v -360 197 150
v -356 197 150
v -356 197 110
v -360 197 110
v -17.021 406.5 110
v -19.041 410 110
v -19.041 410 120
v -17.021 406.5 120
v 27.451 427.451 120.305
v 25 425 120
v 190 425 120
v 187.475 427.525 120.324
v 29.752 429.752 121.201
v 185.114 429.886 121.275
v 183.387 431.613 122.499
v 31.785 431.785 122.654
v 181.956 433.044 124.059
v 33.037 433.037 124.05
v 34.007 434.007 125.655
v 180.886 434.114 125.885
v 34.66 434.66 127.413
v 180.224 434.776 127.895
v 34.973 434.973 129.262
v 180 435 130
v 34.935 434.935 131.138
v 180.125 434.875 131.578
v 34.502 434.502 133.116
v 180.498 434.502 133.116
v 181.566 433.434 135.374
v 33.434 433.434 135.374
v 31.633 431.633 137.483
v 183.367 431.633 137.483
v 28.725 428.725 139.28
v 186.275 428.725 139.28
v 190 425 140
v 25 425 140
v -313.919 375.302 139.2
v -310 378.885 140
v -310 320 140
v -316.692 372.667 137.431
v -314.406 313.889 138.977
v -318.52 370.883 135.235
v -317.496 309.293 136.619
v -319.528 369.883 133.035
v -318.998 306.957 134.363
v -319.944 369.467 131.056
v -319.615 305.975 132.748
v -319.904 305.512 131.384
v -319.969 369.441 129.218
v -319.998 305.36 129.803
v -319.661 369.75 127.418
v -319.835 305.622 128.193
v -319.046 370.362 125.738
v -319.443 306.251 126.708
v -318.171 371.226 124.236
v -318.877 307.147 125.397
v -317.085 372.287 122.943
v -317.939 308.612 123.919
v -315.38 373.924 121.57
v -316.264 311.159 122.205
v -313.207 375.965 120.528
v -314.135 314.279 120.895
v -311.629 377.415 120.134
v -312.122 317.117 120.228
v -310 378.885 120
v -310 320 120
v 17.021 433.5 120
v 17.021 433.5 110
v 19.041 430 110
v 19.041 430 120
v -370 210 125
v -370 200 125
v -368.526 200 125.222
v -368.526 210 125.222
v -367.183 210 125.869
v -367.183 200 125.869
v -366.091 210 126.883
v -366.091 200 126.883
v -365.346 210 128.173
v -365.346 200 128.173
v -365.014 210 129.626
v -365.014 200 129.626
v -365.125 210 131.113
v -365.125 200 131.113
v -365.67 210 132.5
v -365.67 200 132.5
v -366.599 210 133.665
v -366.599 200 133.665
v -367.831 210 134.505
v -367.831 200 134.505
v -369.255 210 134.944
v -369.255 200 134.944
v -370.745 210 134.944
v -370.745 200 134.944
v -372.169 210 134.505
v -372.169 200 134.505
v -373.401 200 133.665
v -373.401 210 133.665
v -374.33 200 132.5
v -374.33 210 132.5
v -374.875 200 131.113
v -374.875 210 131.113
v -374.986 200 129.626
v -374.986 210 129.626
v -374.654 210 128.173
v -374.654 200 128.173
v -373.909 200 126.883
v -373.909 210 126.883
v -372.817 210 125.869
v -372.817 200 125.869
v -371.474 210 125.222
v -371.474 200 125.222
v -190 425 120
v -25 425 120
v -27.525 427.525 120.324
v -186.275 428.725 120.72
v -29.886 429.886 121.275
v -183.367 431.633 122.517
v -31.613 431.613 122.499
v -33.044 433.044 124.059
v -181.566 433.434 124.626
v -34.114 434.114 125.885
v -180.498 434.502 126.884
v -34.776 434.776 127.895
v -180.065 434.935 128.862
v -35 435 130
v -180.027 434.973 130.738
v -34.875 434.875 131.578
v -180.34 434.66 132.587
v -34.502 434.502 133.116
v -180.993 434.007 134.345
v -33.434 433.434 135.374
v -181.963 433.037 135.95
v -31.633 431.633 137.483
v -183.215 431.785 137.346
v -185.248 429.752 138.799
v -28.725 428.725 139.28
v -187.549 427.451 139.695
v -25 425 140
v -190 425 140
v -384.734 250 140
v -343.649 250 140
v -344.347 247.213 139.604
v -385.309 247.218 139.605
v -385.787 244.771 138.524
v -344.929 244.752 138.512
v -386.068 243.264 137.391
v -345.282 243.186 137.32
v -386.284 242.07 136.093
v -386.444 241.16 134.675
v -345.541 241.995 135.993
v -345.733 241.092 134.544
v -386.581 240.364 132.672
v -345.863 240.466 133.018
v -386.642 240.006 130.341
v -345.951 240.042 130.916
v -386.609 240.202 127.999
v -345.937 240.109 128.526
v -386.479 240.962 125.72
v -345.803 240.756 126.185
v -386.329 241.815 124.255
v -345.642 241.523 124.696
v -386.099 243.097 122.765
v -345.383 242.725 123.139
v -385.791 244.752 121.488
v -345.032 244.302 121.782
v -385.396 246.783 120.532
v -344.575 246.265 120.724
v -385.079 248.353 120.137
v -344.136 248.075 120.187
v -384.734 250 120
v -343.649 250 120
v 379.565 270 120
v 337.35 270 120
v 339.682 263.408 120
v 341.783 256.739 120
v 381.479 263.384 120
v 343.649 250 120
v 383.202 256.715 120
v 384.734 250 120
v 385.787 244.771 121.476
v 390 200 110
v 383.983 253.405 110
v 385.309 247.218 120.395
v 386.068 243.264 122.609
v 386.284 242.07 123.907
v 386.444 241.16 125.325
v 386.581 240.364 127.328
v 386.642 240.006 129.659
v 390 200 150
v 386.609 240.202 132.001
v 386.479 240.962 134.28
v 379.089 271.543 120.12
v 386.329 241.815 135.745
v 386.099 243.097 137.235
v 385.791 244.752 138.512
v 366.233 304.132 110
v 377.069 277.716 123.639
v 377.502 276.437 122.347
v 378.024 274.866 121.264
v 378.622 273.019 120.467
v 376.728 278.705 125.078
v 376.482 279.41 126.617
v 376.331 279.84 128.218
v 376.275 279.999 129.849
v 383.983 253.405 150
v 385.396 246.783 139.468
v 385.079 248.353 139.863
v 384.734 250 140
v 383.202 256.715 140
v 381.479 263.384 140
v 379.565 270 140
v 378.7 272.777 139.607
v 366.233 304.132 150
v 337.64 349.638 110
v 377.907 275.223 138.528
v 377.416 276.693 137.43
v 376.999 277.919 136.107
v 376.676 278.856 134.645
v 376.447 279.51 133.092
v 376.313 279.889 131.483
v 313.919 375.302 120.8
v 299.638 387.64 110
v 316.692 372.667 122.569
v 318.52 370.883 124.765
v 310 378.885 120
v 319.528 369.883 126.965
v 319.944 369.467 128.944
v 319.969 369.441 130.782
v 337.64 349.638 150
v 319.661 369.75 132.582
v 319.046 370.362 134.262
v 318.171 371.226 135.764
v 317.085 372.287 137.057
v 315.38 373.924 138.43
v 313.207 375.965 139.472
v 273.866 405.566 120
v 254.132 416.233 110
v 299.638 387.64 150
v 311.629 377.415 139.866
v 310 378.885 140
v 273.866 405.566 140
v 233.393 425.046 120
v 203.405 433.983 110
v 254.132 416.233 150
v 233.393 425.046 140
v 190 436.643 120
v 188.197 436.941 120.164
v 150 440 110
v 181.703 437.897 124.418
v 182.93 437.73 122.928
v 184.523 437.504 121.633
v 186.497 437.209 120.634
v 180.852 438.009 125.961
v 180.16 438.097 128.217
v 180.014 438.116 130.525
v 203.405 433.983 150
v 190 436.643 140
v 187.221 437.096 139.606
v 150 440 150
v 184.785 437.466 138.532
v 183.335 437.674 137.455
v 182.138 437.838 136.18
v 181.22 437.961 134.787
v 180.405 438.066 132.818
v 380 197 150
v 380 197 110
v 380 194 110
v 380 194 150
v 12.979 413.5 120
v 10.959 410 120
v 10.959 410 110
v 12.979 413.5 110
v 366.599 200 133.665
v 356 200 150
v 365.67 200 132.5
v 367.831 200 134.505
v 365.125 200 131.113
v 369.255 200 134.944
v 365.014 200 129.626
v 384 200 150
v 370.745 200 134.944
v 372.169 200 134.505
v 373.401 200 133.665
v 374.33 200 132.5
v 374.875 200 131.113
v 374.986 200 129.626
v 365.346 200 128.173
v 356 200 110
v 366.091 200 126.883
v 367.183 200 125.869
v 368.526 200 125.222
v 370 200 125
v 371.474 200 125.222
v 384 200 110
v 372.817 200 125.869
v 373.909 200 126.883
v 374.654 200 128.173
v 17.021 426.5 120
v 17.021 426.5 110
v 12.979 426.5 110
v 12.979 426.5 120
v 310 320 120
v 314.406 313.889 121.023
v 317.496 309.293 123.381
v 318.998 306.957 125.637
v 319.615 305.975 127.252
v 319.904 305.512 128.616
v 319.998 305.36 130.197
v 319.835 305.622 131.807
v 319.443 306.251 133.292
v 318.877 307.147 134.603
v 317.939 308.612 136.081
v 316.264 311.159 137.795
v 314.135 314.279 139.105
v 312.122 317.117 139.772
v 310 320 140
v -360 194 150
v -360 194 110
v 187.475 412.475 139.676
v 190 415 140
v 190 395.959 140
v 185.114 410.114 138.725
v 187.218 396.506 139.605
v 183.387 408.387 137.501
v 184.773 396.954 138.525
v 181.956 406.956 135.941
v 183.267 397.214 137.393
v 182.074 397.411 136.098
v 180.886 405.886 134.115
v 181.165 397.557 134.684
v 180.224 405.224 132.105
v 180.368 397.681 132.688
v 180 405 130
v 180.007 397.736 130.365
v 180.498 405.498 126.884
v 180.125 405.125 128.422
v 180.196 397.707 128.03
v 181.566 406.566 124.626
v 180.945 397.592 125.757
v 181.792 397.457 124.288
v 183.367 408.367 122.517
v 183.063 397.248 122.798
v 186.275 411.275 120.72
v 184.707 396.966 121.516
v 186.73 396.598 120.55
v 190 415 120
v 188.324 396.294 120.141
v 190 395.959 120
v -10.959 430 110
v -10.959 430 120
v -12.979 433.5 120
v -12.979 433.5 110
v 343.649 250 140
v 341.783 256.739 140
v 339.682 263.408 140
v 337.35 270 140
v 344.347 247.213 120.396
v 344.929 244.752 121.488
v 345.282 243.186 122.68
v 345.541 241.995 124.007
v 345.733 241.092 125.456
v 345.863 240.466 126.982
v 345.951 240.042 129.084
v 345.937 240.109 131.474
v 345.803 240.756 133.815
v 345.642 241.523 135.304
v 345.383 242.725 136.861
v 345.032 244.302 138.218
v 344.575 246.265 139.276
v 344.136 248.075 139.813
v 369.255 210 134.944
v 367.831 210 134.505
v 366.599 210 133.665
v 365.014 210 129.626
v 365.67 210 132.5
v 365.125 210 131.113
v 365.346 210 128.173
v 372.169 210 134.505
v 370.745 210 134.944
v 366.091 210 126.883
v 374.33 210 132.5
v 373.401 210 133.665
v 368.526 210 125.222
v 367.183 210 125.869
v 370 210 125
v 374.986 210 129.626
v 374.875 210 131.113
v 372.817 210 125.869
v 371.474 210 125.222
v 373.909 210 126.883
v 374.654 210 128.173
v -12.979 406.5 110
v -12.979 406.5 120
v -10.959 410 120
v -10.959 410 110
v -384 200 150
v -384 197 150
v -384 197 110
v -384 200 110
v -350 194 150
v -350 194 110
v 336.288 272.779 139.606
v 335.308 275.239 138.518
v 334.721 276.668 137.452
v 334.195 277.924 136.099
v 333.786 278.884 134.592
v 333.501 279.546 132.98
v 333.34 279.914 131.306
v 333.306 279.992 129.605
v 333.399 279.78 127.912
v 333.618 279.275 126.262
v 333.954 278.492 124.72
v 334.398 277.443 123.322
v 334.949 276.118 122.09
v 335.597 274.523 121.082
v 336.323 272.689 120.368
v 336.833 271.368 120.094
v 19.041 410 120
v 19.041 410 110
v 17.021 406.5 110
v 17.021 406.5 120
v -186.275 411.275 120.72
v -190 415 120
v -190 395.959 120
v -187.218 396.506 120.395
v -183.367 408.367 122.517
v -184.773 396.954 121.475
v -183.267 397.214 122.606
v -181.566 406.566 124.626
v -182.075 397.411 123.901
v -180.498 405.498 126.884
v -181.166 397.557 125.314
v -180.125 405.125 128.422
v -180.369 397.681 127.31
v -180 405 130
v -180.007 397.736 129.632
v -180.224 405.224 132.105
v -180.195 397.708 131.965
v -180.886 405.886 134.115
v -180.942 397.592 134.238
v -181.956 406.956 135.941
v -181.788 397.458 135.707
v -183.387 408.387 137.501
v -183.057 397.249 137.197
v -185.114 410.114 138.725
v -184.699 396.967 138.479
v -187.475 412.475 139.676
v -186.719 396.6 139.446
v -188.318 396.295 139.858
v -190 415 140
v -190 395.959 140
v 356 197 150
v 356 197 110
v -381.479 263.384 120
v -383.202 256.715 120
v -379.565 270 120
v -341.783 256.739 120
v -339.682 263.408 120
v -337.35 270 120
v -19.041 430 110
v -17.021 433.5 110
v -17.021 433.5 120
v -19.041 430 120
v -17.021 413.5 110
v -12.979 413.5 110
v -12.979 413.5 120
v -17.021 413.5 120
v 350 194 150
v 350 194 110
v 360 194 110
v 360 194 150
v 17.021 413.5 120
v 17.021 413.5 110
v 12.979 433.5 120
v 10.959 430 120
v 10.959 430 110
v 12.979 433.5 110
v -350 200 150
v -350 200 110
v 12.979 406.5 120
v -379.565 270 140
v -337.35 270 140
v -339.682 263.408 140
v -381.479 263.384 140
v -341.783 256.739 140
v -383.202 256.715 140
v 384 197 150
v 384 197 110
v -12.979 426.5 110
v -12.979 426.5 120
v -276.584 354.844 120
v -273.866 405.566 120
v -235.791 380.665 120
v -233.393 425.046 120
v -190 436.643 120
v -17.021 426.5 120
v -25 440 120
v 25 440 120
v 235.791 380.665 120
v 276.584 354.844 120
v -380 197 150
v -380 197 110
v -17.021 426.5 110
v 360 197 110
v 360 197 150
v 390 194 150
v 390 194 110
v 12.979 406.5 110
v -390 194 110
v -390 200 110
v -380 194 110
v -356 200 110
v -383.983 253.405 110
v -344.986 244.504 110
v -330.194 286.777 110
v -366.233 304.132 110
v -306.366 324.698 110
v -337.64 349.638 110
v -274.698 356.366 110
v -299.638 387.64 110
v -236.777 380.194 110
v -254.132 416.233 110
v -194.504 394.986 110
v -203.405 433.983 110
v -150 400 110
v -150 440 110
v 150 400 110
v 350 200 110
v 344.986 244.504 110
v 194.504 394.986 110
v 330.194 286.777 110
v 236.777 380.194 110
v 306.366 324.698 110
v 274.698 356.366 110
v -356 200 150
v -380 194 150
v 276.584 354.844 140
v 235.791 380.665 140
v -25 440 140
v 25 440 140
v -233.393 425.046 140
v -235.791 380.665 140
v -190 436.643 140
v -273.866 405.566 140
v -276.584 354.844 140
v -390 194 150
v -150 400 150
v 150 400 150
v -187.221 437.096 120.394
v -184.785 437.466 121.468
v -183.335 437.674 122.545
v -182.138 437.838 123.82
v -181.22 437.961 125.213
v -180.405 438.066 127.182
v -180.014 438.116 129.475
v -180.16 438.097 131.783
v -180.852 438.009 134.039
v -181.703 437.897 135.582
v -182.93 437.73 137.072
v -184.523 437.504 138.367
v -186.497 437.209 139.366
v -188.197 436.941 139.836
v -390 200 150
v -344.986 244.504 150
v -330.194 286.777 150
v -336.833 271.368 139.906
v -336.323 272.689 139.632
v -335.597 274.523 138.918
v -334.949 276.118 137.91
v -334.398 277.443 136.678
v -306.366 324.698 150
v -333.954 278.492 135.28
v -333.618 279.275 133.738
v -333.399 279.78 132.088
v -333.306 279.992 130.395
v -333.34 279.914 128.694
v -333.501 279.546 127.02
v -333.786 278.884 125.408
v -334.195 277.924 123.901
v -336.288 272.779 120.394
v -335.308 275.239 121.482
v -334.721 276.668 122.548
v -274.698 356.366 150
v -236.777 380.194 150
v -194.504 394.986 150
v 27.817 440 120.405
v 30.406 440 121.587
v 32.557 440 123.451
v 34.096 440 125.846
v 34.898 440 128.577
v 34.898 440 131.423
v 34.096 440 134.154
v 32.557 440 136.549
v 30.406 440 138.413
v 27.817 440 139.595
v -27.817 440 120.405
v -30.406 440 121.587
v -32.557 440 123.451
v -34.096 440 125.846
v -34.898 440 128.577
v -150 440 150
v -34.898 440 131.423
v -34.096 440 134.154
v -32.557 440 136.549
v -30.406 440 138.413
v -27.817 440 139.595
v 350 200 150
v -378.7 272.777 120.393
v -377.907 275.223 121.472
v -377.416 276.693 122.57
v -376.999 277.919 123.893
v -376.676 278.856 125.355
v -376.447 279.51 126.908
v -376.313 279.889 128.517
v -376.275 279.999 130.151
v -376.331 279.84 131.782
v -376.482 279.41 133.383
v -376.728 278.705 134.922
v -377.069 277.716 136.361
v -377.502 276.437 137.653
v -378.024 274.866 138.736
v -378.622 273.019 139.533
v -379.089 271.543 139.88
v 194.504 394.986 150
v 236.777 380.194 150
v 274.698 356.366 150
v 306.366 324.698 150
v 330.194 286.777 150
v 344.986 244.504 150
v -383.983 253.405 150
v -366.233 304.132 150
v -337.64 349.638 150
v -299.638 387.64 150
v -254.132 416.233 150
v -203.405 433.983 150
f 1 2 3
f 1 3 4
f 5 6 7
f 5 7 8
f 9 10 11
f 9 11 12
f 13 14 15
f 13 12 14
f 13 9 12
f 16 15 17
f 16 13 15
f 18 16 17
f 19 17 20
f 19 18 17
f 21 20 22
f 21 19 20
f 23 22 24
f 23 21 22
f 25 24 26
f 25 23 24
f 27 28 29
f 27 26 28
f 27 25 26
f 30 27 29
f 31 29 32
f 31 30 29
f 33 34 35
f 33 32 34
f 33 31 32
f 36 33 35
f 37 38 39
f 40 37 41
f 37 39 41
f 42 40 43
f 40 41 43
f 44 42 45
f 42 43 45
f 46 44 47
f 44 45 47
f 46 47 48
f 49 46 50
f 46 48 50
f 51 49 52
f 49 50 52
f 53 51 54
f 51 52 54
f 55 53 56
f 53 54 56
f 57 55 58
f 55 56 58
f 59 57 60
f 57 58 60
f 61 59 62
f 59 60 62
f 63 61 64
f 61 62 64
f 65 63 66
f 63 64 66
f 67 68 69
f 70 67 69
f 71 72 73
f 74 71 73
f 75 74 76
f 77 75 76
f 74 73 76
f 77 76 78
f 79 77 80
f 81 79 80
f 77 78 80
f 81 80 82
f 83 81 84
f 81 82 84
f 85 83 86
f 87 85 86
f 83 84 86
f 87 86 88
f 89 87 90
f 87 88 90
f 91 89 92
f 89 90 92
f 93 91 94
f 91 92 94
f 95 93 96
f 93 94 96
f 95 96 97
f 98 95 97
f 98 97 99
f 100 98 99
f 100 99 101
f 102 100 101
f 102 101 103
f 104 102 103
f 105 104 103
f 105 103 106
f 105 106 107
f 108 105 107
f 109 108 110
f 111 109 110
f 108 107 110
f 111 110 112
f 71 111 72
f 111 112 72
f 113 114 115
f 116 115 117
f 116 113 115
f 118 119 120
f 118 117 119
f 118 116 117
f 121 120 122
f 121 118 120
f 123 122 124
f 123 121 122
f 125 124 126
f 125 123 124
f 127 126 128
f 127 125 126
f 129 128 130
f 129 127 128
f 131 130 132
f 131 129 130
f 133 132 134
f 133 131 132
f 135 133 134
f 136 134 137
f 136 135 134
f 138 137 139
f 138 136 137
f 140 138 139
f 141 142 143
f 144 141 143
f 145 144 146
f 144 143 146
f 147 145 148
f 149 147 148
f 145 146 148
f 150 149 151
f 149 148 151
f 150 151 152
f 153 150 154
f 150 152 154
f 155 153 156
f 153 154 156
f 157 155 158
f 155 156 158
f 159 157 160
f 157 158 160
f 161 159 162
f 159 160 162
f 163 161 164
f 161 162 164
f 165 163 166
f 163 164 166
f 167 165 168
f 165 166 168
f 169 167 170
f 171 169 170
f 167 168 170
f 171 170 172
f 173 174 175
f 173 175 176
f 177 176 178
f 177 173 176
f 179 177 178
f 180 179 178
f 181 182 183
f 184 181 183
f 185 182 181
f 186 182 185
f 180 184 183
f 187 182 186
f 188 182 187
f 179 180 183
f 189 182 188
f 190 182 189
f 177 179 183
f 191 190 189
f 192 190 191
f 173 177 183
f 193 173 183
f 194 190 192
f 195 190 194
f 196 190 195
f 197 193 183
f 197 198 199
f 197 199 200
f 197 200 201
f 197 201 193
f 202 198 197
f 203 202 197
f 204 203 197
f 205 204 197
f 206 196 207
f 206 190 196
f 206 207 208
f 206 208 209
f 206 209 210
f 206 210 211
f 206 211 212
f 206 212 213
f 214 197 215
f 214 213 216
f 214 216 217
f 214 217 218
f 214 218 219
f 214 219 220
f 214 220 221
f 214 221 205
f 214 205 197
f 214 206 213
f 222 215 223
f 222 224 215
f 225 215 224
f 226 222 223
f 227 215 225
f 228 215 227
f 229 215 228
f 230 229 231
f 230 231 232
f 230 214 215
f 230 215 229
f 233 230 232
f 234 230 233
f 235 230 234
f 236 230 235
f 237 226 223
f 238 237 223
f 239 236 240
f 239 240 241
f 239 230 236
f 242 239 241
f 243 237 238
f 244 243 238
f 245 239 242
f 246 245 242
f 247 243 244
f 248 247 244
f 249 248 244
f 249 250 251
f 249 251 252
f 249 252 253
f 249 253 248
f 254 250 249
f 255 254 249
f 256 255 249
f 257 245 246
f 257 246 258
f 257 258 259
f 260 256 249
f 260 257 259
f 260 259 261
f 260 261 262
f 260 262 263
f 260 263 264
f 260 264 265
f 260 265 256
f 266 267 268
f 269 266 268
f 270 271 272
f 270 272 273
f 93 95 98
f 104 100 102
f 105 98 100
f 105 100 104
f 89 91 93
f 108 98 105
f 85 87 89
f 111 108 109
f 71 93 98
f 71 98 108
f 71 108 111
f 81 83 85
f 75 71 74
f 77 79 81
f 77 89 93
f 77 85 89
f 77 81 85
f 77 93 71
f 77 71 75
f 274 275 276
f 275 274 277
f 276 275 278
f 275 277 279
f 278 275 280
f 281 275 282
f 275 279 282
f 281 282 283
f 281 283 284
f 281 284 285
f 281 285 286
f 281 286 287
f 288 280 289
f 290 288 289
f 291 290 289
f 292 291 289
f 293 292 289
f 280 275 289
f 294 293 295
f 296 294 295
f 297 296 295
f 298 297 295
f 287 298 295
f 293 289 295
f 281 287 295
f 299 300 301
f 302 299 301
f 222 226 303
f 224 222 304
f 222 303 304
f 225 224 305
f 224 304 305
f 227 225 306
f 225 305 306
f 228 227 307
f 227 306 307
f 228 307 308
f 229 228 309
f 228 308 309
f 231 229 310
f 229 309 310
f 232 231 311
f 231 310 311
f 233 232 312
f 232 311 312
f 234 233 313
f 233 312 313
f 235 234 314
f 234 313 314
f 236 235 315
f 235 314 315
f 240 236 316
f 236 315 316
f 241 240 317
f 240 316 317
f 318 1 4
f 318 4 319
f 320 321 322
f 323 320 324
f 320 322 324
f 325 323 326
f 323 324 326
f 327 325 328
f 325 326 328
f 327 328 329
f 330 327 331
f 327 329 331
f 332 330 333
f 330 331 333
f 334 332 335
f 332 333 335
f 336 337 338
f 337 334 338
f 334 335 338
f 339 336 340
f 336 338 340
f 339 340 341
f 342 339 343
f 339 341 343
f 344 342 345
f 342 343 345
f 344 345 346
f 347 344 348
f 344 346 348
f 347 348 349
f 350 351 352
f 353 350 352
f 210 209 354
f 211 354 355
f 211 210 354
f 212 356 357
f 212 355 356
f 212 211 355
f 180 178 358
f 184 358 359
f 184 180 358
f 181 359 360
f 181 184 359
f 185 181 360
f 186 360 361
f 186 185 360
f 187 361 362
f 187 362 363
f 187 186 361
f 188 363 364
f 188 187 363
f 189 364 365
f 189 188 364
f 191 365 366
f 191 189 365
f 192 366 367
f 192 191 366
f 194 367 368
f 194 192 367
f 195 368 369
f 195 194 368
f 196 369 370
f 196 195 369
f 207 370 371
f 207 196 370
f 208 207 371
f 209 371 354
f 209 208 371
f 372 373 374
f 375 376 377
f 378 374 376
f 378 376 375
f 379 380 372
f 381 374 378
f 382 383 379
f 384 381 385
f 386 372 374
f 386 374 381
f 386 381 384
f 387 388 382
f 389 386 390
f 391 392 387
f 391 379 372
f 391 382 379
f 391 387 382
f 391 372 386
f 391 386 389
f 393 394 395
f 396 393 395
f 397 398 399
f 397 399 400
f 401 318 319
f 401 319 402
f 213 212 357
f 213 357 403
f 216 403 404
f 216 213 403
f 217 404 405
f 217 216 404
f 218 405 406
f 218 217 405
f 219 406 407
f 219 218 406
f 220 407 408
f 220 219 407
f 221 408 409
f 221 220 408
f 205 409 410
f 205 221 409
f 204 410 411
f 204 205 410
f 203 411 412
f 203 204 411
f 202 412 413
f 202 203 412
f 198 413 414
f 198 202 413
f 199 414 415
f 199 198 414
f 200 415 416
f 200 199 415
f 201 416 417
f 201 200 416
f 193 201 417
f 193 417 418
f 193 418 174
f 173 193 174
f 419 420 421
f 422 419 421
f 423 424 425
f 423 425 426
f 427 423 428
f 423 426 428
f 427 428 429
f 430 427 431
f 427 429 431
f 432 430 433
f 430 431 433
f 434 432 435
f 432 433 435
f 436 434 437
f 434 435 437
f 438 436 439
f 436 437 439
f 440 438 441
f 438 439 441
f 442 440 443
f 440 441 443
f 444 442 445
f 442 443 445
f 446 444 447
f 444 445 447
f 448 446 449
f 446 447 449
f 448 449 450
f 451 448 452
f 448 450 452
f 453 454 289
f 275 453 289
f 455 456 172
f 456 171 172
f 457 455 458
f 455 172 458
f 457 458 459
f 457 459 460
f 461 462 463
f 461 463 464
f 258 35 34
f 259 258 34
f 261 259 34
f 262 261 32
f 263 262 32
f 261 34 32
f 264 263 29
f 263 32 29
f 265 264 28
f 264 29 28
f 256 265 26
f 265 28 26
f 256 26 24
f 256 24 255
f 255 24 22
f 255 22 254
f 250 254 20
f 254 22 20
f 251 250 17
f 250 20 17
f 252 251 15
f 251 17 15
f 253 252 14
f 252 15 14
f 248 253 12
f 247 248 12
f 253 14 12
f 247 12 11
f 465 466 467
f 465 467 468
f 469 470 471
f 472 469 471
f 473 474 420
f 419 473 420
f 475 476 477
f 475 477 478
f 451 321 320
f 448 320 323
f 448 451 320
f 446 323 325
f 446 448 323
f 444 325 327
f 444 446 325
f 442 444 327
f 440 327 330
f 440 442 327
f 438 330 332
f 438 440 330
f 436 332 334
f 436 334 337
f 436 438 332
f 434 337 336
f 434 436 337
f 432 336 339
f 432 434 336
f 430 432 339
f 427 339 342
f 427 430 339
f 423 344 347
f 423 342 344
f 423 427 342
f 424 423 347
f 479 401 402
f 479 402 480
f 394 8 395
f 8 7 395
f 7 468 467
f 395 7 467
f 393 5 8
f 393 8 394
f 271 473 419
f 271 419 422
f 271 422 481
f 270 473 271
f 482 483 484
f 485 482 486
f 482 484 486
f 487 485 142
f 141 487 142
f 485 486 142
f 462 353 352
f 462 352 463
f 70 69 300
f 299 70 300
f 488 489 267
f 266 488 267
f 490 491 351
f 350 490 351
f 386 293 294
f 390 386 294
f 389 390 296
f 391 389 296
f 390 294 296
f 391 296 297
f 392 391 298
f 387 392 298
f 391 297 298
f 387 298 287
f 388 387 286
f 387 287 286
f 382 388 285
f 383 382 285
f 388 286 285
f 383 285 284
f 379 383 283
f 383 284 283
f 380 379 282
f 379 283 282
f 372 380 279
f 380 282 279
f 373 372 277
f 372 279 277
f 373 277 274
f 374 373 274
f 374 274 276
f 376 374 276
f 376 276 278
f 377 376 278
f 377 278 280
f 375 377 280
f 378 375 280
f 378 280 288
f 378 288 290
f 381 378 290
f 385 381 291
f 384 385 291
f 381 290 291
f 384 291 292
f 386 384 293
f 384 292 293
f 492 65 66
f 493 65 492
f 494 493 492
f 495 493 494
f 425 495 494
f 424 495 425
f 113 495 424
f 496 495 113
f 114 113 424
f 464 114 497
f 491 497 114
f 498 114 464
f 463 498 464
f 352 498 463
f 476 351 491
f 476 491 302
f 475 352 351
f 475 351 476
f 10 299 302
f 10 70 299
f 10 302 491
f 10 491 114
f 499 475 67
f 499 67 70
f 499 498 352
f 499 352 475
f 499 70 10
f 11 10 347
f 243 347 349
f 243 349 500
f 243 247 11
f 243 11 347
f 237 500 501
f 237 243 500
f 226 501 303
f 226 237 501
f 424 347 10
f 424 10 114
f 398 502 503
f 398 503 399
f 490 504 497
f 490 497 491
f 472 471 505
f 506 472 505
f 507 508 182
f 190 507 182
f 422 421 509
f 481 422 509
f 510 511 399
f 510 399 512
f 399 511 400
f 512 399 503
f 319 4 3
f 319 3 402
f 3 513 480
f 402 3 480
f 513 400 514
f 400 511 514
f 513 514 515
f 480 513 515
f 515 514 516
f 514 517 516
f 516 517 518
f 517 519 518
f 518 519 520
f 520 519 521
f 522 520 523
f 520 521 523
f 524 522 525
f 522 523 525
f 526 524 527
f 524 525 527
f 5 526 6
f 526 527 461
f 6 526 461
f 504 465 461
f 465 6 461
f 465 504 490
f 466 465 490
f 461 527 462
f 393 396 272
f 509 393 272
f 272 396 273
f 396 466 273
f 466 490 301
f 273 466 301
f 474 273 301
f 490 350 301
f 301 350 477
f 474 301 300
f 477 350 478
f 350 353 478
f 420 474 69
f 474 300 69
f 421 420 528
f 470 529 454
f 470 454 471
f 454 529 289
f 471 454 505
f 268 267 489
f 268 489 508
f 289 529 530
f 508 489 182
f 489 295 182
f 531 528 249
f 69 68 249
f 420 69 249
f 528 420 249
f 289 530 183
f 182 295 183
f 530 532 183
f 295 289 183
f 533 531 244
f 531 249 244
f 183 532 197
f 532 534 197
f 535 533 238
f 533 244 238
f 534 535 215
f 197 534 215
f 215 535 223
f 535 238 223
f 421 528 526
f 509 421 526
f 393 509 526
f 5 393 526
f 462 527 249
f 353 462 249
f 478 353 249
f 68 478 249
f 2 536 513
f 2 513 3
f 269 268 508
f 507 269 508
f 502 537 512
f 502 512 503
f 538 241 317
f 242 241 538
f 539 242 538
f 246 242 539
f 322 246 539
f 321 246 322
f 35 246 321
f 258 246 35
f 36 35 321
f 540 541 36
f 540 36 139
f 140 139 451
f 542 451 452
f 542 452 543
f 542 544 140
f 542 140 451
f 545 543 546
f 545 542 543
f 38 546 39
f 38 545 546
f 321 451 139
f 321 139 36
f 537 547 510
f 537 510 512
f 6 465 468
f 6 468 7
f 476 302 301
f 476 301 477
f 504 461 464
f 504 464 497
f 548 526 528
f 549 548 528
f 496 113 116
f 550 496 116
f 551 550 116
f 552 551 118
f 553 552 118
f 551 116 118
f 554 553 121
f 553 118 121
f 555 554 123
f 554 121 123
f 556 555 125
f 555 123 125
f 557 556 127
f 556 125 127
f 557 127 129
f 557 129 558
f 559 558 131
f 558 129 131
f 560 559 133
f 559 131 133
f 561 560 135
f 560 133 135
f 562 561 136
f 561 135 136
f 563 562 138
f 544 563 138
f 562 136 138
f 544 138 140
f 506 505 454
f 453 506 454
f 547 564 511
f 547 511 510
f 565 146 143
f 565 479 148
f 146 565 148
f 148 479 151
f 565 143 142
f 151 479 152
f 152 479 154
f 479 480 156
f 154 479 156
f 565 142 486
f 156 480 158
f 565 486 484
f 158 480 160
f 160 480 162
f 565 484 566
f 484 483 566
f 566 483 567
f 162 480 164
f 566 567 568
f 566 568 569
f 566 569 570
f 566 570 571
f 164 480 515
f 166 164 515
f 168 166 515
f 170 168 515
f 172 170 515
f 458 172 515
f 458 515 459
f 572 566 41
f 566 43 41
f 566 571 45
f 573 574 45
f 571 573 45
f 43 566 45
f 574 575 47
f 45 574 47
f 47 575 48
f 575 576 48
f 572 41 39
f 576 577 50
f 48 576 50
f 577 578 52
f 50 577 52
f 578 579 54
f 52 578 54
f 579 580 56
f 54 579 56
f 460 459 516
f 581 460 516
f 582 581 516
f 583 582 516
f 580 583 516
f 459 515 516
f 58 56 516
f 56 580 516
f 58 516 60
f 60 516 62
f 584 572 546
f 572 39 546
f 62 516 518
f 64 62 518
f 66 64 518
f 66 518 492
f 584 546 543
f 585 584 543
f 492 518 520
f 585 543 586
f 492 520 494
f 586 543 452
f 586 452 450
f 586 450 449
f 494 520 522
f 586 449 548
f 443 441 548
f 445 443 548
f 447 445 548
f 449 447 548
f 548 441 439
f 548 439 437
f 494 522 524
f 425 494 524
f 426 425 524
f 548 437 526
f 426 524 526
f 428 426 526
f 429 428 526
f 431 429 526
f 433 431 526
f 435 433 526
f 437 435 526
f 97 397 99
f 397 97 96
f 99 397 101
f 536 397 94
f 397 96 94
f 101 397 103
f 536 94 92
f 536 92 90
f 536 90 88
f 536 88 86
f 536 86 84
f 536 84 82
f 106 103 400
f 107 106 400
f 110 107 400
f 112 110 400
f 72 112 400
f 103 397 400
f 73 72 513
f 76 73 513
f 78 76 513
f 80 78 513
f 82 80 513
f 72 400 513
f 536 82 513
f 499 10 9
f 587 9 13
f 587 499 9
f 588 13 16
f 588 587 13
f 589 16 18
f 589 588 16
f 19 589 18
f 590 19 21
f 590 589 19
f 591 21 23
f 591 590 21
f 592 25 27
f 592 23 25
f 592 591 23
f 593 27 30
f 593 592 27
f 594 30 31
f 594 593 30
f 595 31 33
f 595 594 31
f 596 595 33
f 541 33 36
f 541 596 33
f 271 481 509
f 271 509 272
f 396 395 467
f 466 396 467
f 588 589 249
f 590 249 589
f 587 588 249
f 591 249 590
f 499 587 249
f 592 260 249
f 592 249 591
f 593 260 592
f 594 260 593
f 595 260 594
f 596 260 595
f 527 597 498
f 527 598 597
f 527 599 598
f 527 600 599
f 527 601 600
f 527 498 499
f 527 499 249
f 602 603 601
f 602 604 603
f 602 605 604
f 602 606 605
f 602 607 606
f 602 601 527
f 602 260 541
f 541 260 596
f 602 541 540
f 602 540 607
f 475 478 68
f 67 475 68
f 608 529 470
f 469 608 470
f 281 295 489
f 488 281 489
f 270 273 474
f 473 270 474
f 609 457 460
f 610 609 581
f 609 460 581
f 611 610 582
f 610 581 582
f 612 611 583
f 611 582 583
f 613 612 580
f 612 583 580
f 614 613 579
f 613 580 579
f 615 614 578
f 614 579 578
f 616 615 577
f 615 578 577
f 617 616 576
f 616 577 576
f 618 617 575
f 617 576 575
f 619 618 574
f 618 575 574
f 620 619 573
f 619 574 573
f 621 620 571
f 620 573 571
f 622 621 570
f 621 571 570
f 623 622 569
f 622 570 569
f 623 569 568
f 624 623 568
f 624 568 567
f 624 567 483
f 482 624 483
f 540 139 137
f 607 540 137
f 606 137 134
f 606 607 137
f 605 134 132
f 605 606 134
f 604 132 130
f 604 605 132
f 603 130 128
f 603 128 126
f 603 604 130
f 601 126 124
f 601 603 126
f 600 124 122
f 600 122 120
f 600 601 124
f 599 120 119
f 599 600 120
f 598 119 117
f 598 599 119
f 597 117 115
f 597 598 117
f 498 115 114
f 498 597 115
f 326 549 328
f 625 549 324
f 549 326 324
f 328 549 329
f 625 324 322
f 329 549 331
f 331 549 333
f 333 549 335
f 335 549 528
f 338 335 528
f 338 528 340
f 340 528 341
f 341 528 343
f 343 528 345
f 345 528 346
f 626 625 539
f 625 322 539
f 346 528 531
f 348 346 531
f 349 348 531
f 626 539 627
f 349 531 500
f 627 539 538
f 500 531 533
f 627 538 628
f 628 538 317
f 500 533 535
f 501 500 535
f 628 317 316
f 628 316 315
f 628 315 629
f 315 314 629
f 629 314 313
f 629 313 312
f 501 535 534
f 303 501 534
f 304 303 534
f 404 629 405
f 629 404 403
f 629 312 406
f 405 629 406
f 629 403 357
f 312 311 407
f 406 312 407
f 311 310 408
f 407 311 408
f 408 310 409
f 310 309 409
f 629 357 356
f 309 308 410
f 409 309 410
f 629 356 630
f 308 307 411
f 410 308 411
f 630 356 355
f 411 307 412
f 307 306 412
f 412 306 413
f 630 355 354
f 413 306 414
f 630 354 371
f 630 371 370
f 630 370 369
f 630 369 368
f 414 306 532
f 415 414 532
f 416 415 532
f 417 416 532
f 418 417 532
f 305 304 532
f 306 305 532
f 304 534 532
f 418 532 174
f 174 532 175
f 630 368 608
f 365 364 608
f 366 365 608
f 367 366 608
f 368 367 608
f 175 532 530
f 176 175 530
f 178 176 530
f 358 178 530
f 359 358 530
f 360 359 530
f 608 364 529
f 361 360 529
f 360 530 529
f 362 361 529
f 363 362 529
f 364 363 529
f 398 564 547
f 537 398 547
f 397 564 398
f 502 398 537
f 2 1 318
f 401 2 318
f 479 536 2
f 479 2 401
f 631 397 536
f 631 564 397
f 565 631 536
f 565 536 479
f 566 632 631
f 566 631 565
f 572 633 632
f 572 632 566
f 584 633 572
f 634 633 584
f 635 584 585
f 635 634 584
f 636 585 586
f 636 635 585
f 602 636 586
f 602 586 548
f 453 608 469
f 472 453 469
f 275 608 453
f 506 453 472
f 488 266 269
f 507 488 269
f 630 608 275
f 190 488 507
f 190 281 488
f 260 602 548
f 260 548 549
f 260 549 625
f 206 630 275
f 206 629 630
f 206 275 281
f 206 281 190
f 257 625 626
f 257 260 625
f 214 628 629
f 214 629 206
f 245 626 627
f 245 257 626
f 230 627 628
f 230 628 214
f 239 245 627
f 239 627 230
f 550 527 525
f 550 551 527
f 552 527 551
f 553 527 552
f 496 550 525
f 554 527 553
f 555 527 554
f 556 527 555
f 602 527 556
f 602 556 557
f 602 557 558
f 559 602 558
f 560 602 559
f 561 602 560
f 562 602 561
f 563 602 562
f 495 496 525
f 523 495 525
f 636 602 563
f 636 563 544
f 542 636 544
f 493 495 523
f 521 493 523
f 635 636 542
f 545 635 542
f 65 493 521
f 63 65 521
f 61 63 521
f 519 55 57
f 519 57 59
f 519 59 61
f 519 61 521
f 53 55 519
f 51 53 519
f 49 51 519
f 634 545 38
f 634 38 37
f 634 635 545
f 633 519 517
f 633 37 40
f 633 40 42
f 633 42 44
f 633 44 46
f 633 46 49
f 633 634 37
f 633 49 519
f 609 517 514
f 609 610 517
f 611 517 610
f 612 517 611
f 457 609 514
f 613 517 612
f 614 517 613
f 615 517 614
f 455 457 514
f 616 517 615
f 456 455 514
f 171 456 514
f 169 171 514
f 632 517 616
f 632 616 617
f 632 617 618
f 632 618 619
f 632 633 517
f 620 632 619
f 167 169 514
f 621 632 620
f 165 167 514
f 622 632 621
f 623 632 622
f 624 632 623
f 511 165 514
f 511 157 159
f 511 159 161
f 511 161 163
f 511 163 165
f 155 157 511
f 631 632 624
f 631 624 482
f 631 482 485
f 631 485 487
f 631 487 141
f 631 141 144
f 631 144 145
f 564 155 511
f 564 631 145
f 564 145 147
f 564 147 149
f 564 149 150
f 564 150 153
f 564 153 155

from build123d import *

# Parameters (mm, degrees)
AUFSATZ_LINEAR_AUSTRAGEN1_DEPTH      = 150
SCHNITT_LINEAR_AUSTRAGEN2_DEPTH      = 658.647321898
SCHNITT_LINEAR_AUSTRAGEN2_DEPTH_BACK = 658.647321898
SCHNITT_LINEAR_AUSTRAGEN7_REACH      = 928.607
SCHNITT_LINEAR_AUSTRAGEN7_END_RADIUS = 10
SCHNITT_LINEAR_AUSTRAGEN8_DEPTH      = 180
AUFSATZ_LINEAR_AUSTRAGEN2_DEPTH      = 150
SKIZZE15_W                           = 1390.722154613
SKIZZE15_H                           = 110
SCHNITT_LINEAR_AUSTRAGEN16_DEPTH     = 1000
SCHNITT_LINEAR_AUSTRAGEN22_DEPTH     = 200
SCHNITT_LINEAR_AUSTRAGEN27_DEPTH     = 120
SKIZZE2_R                            = 5
SCHNITT_LINEAR_AUSTRAGEN28_DEPTH     = 10
AUFSATZ_LINEAR_AUSTRAGEN3_DEPTH      = 40
SCHNITT_LINEAR_AUSTRAGEN29_DEPTH     = 200
SCHNITT_LINEAR_START                 = 300
SCHNITT_LINEAR_AUSTRAGEN30_DEPTH     = 300


with BuildPart() as part:
    # Skizze1 → Aufsatz-Linear austragen1 (new body)
    with BuildSketch(Plane.XY):
        with BuildLine():
            Line((150, 600), (-150, 600))
            ThreePointArc((-150, 600), (-353.150600634, 544.571956871), (-500, 393.64916731))
            Line((-500, 393.64916731), (-500, 200))
            Line((-500, 200), (-350, 200))
            ThreePointArc((-350, 200), (-291.421356237, 341.421356237), (-150, 400))
            Line((-150, 400), (150, 400))
            ThreePointArc((150, 400), (291.421356237, 341.421356237), (350, 200))
            Line((350, 200), (500, 200))
            Line((500, 200), (500, 393.64916731))
            ThreePointArc((500, 393.64916731), (353.150600634, 544.571956871), (150, 600))
        make_face()
    extrude(amount=AUFSATZ_LINEAR_AUSTRAGEN1_DEPTH)

    # Skizze4 → Schnitt-Linear austragen2 (cut, two sides: drawn at the far end of the back side and taken through both)
    with BuildSketch(Plane(origin=(0, 600, 0), x_dir=(1, 0, 0), z_dir=(0, 1, 0)).offset(-SCHNITT_LINEAR_AUSTRAGEN2_DEPTH_BACK)):
        with BuildLine():
            Line((-310, -120), (-190, -120))
            ThreePointArc((-190, -120), (-180, -130), (-190, -140))
            Line((-190, -140), (-310, -140))
            ThreePointArc((-310, -140), (-320, -130), (-310, -120))
        make_face()
        with BuildLine():
            Line((190, -120), (310, -120))
            ThreePointArc((310, -120), (320, -130), (310, -140))
            Line((310, -140), (190, -140))
            ThreePointArc((190, -140), (180, -130), (190, -120))
        make_face()
    extrude(amount=SCHNITT_LINEAR_AUSTRAGEN2_DEPTH + SCHNITT_LINEAR_AUSTRAGEN2_DEPTH_BACK, mode=Mode.SUBTRACT)

    # Schnitt-Linear austragen7: up to this cylinder (the profile starts outside it)
    schnitt_linear_austragen7_end = Plane(origin=(190, 420, 130), z_dir=(0, 1, 0)) * Cylinder(SCHNITT_LINEAR_AUSTRAGEN7_END_RADIUS, 1878.214, mode=Mode.PRIVATE)
    # Skizze5 → Schnitt-Linear austragen7 (cut, up to the surface)
    with BuildSketch(Plane.ZY.offset(190), mode=Mode.PRIVATE) as schnitt_linear_austragen7_sk1:
        with BuildLine():
            Line((140, 425), (140, 415))
            ThreePointArc((140, 415), (130, 405), (120, 415))
            Line((120, 415), (120, 425))
            ThreePointArc((120, 425), (130, 435), (140, 425))
        make_face()
    schnitt_linear_austragen7_tool1 = extrude(schnitt_linear_austragen7_sk1.sketch, amount=-SCHNITT_LINEAR_AUSTRAGEN7_REACH, mode=Mode.PRIVATE) - schnitt_linear_austragen7_end
    add(schnitt_linear_austragen7_tool1.solids().sort_by_distance((-190, 420, 130))[0], mode=Mode.SUBTRACT)

    # Skizze3 → Schnitt-Linear austragen8 (cut)
    with BuildSketch(Plane(origin=(0, 600, 0), x_dir=(1, 0, 0), z_dir=(0, 1, 0))):
        with BuildLine():
            Line((-25, -120), (25, -120))
            ThreePointArc((25, -120), (35, -130), (25, -140))
            Line((25, -140), (-25, -140))
            ThreePointArc((-25, -140), (-35, -130), (-25, -120))
        make_face()
    extrude(amount=-SCHNITT_LINEAR_AUSTRAGEN8_DEPTH, mode=Mode.SUBTRACT)

    # Skizze11 → Aufsatz-Linear austragen2 (add)
    with BuildSketch(Plane.XY):
        Polygon((356, 200), (350, 200), (350, 194), (360, 194), (360, 197), (356, 197), align=None)
        Polygon((390, 194), (390, 200), (384, 200), (384, 197), (380, 197), (380, 194), align=None)
    extrude(amount=AUFSATZ_LINEAR_AUSTRAGEN2_DEPTH)

    # Skizze15 → Schnitt-Linear austragen16 (cut)
    with BuildSketch(Plane(origin=(0, 600, 0), x_dir=(1, 0, 0), z_dir=(0, 1, 0))):
        with Locations((37.447933541, -55)):
            Rectangle(SKIZZE15_W, SKIZZE15_H)
    extrude(amount=-SCHNITT_LINEAR_AUSTRAGEN16_DEPTH, mode=Mode.SUBTRACT)

    # Skizze17 → Schnitt-Linear austragen22 (cut)
    with BuildSketch(Plane.XY.offset(150)):
        with BuildLine():
            ThreePointArc((-728.904569039, 200), (-39.53876737, 889.365801669), (649.827034299, 200))
            Line((649.827034299, 200), (390, 200))
            ThreePointArc((390, 200), (319.705627485, 369.705627485), (150, 440))
            Line((150, 440), (-150, 440))
            ThreePointArc((-150, 440), (-319.705627485, 369.705627485), (-390, 200))
            Line((-390, 200), (-728.904569039, 200))
        make_face()
    extrude(amount=-SCHNITT_LINEAR_AUSTRAGEN22_DEPTH, mode=Mode.SUBTRACT)

    # Skizze9 → Schnitt-Linear austragen27 (cut)
    with BuildSketch(Plane(origin=(0, 0, 0), x_dir=(-1, 0, 0), z_dir=(0, 0, -1))):
        Polygon((-12.979274058, 426.5), (-10.958548116, 430), (-12.979274058, 433.5), (-17.020725942, 433.5), (-19.041451884, 430), (-17.020725942, 426.5), align=None)
        Polygon((17.020725942, 426.5), (12.979274058, 426.5), (10.958548116, 430), (12.979274058, 433.5), (17.020725942, 433.5), (19.041451884, 430), align=None)
        Polygon((-12.979274058, 406.5), (-10.958548116, 410), (-12.979274058, 413.5), (-17.020725942, 413.5), (-19.041451884, 410), (-17.020725942, 406.5), align=None)
        Polygon((17.020725942, 406.5), (12.979274058, 406.5), (10.958548116, 410), (12.979274058, 413.5), (17.020725942, 413.5), (19.041451884, 410), align=None)
    extrude(amount=-SCHNITT_LINEAR_AUSTRAGEN27_DEPTH, mode=Mode.SUBTRACT)

    # Skizze2 → Schnitt-Linear austragen28 (cut)
    with BuildSketch(Plane.XZ.offset(-200)):
        with Locations(Location((-370, 130, 0), (0, 0, 270))):
            Circle(SKIZZE2_R)
        with Locations(Location((370, 130, 0), (0, 0, 270))):
            Circle(SKIZZE2_R)
    extrude(amount=-SCHNITT_LINEAR_AUSTRAGEN28_DEPTH, mode=Mode.SUBTRACT)

    # Skizze21 → Aufsatz-Linear austragen3 (add)
    with BuildSketch(Plane.XY.offset(150)):
        Polygon((-384, 200), (-390, 200), (-390, 194), (-380, 194), (-380, 197), (-384, 197), align=None)
        Polygon((-350, 194), (-350, 200), (-356, 200), (-356, 197), (-360, 197), (-360, 194), align=None)
    extrude(amount=-AUFSATZ_LINEAR_AUSTRAGEN3_DEPTH)

    # Skizze22 → Schnitt-Linear austragen29 (cut)
    with BuildSketch(Plane.ZY.offset(190)):
        with BuildLine():
            Line((140, 270), (140, 250))
            ThreePointArc((140, 250), (130, 240), (120, 250))
            Line((120, 250), (120, 270))
            ThreePointArc((120, 270), (130, 280), (140, 270))
        make_face()
    extrude(amount=SCHNITT_LINEAR_AUSTRAGEN29_DEPTH, mode=Mode.SUBTRACT)

    # Skizze23 → Schnitt-Linear austragen30 (cut)
    with BuildSketch(Plane(origin=(150, 0, 0), x_dir=(0, 0, -1), z_dir=(1, 0, 0)).offset(SCHNITT_LINEAR_START)):
        with BuildLine():
            Line((-120, 270), (-120, 250))
            ThreePointArc((-120, 250), (-130, 240), (-140, 250))
            Line((-140, 250), (-140, 270))
            ThreePointArc((-140, 270), (-130, 280), (-120, 270))
        make_face()
    extrude(amount=-SCHNITT_LINEAR_AUSTRAGEN30_DEPTH, mode=Mode.SUBTRACT)


solid = part.part
